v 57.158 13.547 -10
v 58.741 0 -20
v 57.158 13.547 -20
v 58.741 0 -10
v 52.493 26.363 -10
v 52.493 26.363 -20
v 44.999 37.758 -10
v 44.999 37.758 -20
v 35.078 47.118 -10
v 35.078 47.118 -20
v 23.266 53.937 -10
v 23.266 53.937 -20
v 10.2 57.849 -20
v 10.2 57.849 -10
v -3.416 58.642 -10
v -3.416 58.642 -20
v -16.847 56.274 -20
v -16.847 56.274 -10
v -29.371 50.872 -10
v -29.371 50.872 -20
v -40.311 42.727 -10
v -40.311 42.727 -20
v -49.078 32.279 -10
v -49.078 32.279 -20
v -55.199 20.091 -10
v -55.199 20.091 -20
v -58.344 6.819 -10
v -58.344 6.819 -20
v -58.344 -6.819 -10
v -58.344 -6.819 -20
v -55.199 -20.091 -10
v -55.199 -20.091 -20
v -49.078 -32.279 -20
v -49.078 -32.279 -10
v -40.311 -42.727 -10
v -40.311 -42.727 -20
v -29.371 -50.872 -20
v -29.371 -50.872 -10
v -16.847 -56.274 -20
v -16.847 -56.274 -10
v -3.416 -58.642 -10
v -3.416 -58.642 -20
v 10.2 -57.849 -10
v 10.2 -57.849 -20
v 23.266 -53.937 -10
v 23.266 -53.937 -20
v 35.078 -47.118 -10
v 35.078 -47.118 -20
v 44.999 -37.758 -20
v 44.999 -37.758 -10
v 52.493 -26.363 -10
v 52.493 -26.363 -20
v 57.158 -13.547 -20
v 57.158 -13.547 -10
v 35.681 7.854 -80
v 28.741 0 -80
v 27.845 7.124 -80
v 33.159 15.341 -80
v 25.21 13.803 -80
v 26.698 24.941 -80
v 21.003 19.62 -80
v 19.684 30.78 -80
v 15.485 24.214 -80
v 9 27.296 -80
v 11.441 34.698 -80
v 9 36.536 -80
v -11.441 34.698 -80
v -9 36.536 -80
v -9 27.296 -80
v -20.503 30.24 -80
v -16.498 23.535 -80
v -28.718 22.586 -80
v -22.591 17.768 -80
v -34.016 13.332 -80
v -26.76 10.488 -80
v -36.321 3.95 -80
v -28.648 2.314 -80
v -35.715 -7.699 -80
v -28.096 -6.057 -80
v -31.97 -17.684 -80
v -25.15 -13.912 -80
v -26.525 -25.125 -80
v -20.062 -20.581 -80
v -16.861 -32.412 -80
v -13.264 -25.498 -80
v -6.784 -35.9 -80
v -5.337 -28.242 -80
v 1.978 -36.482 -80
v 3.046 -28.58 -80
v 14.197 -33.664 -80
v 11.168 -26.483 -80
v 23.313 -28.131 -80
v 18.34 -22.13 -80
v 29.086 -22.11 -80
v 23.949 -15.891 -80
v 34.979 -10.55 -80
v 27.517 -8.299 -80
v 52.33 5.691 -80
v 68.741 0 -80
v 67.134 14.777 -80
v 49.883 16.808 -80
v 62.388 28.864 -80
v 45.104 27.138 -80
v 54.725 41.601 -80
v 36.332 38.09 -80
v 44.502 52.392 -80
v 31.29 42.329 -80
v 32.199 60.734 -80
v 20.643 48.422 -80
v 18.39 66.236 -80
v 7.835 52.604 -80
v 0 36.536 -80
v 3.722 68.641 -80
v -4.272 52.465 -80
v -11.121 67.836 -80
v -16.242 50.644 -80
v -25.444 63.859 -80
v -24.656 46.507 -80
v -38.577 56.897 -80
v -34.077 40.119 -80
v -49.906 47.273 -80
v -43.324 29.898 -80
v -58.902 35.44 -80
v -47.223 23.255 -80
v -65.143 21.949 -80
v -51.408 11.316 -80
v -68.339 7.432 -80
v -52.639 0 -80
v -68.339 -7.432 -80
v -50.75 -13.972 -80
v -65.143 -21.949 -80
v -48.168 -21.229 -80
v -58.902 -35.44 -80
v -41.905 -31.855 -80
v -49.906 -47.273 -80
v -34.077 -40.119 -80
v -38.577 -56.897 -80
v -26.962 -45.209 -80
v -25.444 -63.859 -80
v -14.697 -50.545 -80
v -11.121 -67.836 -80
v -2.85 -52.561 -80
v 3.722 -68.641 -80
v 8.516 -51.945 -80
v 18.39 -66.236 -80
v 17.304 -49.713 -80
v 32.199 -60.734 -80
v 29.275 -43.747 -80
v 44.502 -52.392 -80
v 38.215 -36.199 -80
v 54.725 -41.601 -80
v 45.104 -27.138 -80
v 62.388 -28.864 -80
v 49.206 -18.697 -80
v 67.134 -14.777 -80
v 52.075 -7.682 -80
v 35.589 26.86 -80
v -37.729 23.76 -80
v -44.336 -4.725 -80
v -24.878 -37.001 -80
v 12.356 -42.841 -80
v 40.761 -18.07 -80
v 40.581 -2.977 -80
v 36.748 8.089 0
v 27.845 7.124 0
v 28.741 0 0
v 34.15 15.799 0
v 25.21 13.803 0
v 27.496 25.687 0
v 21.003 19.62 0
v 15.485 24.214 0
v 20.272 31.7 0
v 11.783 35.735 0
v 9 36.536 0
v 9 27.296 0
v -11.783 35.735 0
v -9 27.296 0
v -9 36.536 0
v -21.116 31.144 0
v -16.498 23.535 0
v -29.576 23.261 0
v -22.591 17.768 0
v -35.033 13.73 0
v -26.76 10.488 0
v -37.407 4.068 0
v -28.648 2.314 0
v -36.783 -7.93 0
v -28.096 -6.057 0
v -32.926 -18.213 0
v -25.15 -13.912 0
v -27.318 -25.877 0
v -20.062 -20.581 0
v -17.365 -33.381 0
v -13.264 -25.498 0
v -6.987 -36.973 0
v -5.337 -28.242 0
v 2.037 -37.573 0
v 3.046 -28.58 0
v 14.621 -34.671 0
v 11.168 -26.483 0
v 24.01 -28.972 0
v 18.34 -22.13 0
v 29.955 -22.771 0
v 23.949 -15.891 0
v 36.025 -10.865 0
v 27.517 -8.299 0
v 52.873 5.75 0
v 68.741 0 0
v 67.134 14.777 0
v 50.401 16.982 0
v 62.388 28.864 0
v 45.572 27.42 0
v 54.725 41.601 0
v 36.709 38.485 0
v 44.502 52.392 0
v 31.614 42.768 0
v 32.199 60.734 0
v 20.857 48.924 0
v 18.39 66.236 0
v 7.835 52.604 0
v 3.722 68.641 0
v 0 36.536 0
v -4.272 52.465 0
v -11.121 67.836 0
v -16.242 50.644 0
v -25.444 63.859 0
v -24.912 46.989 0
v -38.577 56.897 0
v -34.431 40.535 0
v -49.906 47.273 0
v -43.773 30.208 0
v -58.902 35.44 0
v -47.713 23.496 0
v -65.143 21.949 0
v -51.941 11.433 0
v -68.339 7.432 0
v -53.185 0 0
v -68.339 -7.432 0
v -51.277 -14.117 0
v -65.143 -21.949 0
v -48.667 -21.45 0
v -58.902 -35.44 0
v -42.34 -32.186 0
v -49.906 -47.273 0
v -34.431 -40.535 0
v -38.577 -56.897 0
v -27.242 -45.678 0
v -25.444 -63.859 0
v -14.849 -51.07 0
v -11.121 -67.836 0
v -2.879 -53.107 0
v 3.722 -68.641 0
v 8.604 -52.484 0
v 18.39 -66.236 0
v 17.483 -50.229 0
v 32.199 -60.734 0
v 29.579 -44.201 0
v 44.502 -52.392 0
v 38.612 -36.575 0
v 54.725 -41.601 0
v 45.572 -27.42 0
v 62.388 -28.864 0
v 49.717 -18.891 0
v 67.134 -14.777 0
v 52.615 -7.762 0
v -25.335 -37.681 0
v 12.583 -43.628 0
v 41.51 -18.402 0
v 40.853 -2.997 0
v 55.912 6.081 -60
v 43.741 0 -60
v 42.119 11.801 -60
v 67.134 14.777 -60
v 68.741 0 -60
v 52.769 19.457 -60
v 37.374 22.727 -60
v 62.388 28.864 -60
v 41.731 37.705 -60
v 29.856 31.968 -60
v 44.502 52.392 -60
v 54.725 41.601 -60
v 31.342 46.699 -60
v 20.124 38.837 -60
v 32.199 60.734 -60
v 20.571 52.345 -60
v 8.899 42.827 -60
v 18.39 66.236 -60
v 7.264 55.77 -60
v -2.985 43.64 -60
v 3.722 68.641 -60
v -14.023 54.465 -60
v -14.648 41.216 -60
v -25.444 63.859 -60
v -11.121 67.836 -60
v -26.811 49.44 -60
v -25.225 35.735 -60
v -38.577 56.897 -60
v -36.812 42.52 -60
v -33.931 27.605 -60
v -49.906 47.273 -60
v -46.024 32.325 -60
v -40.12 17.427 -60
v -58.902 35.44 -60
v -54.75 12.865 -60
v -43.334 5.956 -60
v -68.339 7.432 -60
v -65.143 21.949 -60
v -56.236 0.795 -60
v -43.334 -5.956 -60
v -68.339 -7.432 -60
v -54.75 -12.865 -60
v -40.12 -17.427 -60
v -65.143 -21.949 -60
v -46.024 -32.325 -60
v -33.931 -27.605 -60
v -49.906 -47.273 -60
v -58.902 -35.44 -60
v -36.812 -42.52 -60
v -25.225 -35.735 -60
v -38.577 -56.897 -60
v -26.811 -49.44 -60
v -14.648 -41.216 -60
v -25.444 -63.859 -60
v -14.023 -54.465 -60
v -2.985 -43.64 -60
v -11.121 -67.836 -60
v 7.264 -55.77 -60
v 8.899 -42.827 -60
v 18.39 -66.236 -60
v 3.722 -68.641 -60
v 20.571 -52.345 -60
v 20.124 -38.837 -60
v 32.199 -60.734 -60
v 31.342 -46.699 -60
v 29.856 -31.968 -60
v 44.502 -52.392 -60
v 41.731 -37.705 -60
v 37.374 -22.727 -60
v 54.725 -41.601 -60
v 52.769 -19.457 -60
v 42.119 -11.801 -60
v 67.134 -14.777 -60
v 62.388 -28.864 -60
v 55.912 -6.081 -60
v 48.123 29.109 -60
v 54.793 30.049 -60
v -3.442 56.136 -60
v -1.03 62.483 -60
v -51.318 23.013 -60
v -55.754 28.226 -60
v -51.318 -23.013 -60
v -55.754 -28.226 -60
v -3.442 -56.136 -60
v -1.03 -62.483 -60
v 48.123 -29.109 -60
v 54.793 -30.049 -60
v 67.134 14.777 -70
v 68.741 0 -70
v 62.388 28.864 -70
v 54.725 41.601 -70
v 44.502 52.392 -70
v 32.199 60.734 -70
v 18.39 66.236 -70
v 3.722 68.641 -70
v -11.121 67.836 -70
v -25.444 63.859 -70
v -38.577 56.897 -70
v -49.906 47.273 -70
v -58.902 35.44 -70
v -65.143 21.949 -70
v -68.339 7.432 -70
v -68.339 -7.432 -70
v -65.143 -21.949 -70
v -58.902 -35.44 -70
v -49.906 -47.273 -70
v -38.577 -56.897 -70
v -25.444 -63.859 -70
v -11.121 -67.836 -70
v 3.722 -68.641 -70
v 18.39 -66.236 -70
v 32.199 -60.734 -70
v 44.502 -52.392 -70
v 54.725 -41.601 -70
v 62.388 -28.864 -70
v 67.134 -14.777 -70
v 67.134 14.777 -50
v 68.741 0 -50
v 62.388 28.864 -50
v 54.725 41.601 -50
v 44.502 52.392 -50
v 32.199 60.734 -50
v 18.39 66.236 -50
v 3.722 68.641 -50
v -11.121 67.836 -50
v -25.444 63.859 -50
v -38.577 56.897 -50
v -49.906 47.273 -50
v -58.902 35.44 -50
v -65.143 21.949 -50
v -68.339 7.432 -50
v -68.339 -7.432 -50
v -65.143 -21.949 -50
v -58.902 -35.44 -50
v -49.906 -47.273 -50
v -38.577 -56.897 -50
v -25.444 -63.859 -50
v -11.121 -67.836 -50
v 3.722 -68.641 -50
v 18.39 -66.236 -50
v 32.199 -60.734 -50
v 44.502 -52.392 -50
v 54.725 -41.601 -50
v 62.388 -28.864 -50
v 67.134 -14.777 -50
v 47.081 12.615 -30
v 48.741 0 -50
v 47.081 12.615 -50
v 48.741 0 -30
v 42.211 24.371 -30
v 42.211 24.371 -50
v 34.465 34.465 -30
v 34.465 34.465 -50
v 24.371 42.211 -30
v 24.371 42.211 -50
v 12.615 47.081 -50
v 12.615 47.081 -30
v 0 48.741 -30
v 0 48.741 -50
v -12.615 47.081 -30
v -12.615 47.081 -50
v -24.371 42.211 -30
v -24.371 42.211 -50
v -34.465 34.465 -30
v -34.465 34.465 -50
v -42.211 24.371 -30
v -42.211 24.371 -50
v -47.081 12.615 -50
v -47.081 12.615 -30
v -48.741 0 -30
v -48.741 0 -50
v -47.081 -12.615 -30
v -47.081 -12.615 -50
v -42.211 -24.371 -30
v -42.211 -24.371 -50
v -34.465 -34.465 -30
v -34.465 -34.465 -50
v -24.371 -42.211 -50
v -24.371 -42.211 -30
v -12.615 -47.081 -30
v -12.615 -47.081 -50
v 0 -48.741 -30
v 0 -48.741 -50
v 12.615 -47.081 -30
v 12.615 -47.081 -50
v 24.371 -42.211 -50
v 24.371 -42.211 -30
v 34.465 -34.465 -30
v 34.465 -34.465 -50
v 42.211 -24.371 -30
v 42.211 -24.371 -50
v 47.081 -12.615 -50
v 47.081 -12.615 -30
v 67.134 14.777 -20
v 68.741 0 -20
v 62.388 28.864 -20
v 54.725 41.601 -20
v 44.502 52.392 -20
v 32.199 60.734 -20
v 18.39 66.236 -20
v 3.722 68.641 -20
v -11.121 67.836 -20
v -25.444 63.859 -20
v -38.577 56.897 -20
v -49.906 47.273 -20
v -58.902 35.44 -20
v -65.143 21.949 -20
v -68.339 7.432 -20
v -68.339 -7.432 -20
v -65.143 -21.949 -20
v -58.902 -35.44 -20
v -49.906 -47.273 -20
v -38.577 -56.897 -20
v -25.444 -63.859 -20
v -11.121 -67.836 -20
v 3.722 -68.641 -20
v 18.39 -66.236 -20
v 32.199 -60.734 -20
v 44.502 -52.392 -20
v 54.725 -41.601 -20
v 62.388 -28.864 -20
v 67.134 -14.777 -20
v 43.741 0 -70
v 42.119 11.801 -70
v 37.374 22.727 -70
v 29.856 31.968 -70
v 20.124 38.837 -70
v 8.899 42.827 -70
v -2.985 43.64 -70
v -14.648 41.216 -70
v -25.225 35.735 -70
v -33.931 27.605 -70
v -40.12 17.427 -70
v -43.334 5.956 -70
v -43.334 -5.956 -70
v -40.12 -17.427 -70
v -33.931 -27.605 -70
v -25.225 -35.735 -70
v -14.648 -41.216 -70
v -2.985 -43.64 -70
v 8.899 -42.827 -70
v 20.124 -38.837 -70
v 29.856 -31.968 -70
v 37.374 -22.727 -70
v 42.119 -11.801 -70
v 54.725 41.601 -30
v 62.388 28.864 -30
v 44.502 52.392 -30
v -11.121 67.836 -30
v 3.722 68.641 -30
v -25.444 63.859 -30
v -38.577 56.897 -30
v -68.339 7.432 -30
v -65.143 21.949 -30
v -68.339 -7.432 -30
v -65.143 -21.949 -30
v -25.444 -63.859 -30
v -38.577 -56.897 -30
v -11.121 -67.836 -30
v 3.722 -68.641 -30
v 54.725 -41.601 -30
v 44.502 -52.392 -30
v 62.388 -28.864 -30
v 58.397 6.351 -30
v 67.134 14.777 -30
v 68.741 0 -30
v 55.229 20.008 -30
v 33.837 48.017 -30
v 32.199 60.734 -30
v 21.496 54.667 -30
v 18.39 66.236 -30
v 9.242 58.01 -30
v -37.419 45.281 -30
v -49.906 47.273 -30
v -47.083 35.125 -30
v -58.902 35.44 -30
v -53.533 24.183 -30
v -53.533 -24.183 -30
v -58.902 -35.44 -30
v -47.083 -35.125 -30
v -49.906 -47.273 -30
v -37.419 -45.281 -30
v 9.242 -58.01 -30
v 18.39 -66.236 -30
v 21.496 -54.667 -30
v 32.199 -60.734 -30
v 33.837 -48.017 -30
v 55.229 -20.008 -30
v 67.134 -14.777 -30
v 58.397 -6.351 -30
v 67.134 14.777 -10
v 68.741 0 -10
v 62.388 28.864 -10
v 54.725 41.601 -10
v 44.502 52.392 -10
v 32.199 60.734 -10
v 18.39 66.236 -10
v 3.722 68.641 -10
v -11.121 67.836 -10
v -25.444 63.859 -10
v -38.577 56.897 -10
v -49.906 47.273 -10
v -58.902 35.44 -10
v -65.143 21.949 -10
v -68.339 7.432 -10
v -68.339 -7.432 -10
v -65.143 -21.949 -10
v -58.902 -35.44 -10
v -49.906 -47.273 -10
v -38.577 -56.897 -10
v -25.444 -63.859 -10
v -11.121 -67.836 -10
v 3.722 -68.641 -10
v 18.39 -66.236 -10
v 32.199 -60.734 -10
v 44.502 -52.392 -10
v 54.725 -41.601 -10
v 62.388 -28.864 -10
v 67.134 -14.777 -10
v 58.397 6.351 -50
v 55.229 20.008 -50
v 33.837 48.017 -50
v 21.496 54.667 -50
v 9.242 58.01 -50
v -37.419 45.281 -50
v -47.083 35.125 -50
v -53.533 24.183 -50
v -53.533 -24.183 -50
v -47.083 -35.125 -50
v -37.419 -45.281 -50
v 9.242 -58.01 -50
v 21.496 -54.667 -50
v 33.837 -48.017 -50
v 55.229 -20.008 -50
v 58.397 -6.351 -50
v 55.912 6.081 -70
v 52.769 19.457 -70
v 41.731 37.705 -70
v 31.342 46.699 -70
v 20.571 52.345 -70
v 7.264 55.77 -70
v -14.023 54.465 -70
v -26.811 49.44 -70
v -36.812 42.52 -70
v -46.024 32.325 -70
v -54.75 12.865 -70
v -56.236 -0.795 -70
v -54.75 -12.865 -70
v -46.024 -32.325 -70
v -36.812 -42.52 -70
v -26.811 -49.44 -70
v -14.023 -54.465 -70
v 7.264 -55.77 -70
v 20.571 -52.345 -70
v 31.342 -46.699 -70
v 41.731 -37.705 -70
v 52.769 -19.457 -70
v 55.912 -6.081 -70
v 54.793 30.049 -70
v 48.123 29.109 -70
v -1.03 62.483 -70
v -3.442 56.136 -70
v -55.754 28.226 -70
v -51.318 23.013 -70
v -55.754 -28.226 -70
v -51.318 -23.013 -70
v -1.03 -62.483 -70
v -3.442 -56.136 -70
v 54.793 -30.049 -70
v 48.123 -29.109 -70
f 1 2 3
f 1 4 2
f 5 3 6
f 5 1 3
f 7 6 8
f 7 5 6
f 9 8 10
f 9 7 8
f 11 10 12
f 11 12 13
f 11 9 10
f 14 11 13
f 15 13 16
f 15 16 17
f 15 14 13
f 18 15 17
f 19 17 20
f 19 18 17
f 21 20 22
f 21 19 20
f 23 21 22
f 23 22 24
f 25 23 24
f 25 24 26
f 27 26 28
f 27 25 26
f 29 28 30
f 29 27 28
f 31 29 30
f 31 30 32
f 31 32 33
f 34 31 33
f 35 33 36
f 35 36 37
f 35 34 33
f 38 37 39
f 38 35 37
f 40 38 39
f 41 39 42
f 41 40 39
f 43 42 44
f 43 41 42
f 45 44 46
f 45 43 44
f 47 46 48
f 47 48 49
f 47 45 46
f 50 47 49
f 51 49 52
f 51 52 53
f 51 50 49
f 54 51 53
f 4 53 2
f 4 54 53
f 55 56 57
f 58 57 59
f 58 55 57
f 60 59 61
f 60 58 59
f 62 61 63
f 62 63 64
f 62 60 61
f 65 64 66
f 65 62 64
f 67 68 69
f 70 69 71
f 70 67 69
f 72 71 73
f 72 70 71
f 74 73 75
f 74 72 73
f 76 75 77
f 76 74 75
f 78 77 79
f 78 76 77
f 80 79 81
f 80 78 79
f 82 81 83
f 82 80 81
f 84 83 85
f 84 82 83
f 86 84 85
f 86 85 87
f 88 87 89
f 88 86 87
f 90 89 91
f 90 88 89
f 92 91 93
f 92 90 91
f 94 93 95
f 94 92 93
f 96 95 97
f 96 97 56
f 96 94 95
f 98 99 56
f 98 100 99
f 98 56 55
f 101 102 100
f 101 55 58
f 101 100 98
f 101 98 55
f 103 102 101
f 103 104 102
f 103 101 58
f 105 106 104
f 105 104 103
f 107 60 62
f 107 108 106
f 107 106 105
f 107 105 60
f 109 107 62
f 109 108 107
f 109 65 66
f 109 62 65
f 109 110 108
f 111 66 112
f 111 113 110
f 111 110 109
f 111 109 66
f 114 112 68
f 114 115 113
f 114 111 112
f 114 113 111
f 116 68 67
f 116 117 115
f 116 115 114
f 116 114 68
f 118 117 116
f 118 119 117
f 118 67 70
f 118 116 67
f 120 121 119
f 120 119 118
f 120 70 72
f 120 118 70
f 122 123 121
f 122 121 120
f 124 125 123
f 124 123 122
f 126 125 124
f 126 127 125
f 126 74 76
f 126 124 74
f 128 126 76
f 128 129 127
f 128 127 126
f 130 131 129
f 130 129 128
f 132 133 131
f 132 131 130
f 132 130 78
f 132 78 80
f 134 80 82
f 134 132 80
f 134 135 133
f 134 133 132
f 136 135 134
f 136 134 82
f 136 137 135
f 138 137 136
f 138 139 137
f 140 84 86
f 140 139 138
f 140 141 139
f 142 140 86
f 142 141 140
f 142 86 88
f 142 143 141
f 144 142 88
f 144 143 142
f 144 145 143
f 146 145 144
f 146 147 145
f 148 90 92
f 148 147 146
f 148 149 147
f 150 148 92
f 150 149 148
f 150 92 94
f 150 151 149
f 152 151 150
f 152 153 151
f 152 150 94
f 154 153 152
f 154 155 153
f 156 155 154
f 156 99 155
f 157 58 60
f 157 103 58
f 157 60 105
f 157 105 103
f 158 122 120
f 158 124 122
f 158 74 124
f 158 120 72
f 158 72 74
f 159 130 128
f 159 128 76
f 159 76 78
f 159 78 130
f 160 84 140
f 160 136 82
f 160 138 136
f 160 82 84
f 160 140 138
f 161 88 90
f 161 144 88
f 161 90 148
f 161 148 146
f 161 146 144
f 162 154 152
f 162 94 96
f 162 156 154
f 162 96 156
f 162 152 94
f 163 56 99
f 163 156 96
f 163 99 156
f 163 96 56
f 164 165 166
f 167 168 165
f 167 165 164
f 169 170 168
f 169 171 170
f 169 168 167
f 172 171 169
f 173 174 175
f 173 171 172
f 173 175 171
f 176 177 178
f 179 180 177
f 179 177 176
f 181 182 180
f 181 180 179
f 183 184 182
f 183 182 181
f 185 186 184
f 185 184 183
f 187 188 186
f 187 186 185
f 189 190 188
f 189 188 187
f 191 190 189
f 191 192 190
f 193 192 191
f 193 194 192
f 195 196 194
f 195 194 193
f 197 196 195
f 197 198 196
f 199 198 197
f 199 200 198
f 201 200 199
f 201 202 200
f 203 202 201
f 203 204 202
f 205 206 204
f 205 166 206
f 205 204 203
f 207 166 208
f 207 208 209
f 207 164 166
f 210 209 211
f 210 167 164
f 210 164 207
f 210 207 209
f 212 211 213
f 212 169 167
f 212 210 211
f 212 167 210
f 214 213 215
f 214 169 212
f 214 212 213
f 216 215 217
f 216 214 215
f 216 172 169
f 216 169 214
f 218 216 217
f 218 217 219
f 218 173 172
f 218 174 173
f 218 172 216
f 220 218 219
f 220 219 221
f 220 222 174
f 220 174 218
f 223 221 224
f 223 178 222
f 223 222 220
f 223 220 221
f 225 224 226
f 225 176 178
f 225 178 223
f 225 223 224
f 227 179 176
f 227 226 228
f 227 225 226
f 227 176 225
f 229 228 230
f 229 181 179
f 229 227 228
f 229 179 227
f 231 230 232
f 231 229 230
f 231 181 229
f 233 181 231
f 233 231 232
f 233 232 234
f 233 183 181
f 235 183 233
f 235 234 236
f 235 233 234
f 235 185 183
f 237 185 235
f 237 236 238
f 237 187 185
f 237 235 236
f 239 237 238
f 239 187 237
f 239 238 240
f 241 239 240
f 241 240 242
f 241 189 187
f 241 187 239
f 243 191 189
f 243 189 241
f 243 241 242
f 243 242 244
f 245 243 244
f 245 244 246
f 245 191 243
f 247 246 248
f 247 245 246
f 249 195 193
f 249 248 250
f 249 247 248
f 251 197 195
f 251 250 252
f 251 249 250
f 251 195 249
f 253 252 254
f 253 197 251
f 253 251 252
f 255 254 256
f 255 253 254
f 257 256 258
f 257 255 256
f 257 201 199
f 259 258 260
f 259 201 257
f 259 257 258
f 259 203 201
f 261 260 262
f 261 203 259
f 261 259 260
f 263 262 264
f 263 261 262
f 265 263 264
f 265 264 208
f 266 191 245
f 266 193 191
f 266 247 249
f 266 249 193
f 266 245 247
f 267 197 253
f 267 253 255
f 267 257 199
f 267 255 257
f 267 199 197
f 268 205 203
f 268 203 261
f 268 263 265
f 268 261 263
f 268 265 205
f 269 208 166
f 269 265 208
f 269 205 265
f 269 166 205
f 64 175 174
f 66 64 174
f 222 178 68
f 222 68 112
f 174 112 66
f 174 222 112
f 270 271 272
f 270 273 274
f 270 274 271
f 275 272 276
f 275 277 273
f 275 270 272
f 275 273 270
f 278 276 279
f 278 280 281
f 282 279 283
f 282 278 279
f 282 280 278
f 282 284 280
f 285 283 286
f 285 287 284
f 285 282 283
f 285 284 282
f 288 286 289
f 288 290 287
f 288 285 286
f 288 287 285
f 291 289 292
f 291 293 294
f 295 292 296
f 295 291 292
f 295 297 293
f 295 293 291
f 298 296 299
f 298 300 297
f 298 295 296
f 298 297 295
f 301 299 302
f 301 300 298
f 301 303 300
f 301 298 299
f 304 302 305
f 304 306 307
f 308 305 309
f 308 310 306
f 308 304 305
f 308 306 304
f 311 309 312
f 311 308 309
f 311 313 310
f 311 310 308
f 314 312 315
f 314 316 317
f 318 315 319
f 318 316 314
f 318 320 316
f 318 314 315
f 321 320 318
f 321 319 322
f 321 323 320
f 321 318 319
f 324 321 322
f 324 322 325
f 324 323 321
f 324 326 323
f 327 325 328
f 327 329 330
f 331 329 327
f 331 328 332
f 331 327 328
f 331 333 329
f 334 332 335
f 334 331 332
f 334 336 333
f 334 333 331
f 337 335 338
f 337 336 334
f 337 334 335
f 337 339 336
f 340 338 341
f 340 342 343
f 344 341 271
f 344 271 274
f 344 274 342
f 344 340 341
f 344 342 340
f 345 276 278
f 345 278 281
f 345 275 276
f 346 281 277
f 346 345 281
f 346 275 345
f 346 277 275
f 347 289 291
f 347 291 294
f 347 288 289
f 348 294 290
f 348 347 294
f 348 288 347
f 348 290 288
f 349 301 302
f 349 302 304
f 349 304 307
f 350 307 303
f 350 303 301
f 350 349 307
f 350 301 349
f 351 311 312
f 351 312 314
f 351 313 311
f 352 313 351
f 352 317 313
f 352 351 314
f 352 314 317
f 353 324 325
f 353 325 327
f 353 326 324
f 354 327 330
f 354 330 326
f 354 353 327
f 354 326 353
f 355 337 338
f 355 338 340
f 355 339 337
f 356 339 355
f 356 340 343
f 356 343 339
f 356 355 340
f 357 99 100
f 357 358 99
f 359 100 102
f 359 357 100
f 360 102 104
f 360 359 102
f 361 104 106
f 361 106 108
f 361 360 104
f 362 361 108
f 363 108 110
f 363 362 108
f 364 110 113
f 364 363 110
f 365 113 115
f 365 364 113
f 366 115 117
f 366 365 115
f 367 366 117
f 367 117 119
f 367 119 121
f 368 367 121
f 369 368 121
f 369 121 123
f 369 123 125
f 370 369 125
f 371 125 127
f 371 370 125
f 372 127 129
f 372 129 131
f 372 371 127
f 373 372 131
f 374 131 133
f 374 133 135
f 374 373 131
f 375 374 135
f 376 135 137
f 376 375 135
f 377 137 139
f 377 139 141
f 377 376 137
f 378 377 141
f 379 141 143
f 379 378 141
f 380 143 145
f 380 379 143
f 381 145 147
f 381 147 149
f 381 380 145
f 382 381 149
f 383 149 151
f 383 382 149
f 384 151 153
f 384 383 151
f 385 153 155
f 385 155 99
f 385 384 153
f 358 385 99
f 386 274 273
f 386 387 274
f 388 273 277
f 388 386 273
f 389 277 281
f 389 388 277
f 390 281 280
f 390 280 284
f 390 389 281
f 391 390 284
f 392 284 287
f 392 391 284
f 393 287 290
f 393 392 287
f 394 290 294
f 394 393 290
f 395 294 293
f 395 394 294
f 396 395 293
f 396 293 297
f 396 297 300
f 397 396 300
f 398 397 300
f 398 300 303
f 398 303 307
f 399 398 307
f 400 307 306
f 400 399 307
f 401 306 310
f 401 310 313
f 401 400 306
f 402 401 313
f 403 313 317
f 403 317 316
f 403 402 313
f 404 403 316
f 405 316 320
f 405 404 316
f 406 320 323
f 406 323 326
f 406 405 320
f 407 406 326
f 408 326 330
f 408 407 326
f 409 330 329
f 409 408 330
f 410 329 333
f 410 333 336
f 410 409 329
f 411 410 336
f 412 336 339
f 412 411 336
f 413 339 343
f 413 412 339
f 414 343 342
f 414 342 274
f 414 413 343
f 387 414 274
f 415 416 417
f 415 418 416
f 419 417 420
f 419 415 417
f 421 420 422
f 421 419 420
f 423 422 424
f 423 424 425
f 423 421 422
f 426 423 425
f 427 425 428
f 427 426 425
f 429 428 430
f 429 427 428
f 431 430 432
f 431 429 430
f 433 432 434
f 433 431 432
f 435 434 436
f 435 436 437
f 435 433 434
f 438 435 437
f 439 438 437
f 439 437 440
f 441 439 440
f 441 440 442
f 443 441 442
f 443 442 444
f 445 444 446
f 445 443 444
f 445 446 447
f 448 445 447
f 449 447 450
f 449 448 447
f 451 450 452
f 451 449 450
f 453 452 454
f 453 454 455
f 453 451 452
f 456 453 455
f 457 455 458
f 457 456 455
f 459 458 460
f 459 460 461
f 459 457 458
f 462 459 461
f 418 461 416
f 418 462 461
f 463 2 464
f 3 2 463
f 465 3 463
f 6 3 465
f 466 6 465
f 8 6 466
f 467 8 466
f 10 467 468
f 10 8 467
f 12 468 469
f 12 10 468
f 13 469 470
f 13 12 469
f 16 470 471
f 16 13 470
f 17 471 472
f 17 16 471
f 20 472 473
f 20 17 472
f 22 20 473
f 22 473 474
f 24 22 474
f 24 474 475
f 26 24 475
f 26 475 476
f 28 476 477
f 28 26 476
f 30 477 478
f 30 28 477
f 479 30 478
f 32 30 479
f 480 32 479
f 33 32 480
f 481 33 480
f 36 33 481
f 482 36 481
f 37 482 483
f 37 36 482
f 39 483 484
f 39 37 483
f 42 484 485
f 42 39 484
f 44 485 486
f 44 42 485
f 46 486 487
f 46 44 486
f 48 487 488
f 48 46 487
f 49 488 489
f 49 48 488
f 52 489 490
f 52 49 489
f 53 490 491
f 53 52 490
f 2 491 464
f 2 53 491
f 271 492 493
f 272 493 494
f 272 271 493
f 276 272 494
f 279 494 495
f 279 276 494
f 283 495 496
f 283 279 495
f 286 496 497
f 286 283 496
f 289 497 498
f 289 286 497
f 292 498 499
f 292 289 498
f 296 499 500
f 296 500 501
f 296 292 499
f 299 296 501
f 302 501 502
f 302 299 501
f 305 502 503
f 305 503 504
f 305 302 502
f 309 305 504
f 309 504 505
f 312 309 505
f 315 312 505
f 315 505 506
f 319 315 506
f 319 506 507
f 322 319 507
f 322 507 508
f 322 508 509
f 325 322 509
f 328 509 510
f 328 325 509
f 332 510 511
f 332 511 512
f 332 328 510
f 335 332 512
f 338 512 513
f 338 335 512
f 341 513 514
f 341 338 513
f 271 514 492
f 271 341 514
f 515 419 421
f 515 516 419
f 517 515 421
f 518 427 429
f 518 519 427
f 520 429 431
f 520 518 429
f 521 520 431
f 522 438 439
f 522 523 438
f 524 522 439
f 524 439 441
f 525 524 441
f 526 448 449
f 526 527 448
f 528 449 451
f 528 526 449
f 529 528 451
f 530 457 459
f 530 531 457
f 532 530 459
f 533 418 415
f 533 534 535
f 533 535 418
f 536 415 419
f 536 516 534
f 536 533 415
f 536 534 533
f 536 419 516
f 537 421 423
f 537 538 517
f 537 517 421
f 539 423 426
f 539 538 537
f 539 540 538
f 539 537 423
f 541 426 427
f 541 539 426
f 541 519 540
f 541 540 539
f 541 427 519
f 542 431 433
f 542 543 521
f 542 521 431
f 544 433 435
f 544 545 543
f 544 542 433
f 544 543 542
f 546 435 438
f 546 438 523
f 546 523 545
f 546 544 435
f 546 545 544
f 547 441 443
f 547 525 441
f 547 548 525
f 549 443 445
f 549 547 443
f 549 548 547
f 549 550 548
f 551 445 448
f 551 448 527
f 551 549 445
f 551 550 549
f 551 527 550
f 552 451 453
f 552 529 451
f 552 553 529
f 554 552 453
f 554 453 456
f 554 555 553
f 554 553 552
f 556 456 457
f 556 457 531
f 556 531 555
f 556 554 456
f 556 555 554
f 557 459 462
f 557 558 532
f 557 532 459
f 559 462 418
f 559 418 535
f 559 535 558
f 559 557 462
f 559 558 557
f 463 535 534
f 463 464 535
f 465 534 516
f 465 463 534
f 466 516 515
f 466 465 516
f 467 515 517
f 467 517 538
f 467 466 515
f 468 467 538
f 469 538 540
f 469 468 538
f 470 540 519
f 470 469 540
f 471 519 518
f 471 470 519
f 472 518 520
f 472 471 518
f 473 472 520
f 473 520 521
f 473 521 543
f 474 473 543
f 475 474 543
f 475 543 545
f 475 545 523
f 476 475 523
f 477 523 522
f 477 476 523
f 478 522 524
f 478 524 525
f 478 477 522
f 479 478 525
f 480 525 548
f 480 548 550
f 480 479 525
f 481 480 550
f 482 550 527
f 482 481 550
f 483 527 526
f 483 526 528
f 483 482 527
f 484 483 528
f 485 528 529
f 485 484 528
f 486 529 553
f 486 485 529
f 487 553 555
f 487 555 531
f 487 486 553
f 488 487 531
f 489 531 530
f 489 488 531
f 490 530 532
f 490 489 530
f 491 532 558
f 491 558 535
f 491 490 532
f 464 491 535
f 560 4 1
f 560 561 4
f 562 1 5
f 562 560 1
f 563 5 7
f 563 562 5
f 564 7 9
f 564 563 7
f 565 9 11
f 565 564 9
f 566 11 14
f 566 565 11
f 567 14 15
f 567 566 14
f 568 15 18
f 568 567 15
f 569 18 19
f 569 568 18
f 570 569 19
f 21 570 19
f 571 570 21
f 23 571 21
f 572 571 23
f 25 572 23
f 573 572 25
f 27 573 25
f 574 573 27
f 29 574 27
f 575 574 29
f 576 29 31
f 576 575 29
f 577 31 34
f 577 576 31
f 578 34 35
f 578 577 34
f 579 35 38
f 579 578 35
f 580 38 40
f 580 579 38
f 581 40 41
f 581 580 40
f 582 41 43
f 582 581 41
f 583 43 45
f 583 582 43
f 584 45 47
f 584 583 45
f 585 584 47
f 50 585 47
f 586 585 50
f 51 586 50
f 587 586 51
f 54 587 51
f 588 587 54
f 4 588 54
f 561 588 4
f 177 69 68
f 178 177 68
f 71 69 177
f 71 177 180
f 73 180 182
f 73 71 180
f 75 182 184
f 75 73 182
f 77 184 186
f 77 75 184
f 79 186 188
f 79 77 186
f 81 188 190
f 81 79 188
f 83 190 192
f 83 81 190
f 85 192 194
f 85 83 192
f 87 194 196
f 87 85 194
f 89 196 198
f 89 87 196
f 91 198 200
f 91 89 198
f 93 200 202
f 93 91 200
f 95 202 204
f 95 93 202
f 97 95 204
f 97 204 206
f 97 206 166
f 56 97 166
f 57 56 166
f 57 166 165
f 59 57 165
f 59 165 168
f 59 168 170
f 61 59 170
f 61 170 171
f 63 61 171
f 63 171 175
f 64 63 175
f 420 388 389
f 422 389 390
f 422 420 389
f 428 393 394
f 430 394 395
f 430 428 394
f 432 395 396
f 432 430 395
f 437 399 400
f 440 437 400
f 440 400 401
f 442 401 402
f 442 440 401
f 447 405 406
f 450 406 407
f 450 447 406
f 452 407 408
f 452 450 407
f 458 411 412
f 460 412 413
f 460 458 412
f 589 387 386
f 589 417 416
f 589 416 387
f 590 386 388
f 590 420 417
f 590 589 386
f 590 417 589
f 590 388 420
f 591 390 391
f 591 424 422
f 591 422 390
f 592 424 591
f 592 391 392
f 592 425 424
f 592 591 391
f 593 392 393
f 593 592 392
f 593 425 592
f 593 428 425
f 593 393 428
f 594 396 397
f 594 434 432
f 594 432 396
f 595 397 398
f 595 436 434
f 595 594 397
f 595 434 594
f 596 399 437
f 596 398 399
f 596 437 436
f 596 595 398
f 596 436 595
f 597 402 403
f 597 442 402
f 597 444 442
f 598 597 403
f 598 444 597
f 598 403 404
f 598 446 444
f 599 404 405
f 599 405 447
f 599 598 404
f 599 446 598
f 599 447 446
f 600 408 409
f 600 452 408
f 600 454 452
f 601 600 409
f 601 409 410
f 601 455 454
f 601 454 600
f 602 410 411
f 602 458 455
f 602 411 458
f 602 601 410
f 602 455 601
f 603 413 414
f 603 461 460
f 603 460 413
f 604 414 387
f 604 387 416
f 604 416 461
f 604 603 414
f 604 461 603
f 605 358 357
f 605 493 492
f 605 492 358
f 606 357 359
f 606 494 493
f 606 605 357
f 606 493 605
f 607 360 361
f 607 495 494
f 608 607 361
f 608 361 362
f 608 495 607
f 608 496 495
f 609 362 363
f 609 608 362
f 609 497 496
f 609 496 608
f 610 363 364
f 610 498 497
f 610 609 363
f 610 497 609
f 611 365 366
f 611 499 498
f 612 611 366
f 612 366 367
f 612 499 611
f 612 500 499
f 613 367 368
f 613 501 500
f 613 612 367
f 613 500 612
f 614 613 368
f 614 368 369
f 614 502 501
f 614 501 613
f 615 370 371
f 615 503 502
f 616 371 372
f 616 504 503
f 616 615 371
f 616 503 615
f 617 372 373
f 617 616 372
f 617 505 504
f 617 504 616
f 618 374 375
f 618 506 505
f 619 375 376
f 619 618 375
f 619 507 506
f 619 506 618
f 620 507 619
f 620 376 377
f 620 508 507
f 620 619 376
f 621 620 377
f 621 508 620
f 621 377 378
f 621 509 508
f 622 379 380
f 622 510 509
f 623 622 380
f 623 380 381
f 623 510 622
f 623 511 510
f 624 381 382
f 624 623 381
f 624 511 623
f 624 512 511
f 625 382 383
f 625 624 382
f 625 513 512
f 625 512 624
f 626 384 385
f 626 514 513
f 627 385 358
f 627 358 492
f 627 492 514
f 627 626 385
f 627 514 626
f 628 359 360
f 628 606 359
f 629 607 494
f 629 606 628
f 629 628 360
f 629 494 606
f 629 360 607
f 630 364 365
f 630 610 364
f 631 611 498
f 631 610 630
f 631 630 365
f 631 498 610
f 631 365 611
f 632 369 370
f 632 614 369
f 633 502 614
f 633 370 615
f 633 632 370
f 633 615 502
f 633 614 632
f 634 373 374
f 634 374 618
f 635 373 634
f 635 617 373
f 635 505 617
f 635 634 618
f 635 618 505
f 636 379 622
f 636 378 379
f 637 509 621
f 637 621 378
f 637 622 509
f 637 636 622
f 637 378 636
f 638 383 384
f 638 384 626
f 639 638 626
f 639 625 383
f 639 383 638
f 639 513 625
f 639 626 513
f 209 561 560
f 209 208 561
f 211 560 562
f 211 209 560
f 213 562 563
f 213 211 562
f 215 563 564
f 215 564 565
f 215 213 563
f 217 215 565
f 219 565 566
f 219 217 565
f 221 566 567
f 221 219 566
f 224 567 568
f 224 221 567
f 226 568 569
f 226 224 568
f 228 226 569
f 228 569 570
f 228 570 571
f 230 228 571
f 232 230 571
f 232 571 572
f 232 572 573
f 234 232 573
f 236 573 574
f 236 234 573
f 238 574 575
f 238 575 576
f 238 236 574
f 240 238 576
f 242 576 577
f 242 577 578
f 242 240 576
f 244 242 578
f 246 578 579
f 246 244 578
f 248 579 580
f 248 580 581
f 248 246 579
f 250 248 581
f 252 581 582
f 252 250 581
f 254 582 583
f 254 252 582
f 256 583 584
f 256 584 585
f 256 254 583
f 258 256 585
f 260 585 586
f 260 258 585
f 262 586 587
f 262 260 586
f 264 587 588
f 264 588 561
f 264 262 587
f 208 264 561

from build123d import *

# Parameters (mm, degrees)
F3_W     = 18
F3_H     = 15
F4_DEPTH = 80.001


with BuildPart() as f2:
    # F2: sweep along a path in F1
    with BuildLine(Plane.XY) as f2_path:
        CenterArc((0, 0), 28.500317, 0, 360)
    # F0 (on Front) → F2 (sweep)
    with BuildSketch(Plane.XZ):
        Polygon((68.741494, 0), (28.741494, 0), (28.741494, -80), (68.741494, -80), (68.741494, -70), (43.741494, -70), (43.741494, -60), (68.741494, -60), (68.741494, -50), (48.741494, -50), (48.741494, -30), (68.741494, -30), (68.741494, -20), (58.741494, -20), (58.741494, -10), (68.741494, -10), align=None)
    sweep(path=f2_path.line)

    # F3 (on Top) → F4 (cut, through all)
    with BuildSketch(Plane.XY):
        with Locations((0, 29.035522)):
            Rectangle(F3_W, F3_H)
    extrude(amount=-F4_DEPTH, mode=Mode.SUBTRACT)


solid = f2.part
